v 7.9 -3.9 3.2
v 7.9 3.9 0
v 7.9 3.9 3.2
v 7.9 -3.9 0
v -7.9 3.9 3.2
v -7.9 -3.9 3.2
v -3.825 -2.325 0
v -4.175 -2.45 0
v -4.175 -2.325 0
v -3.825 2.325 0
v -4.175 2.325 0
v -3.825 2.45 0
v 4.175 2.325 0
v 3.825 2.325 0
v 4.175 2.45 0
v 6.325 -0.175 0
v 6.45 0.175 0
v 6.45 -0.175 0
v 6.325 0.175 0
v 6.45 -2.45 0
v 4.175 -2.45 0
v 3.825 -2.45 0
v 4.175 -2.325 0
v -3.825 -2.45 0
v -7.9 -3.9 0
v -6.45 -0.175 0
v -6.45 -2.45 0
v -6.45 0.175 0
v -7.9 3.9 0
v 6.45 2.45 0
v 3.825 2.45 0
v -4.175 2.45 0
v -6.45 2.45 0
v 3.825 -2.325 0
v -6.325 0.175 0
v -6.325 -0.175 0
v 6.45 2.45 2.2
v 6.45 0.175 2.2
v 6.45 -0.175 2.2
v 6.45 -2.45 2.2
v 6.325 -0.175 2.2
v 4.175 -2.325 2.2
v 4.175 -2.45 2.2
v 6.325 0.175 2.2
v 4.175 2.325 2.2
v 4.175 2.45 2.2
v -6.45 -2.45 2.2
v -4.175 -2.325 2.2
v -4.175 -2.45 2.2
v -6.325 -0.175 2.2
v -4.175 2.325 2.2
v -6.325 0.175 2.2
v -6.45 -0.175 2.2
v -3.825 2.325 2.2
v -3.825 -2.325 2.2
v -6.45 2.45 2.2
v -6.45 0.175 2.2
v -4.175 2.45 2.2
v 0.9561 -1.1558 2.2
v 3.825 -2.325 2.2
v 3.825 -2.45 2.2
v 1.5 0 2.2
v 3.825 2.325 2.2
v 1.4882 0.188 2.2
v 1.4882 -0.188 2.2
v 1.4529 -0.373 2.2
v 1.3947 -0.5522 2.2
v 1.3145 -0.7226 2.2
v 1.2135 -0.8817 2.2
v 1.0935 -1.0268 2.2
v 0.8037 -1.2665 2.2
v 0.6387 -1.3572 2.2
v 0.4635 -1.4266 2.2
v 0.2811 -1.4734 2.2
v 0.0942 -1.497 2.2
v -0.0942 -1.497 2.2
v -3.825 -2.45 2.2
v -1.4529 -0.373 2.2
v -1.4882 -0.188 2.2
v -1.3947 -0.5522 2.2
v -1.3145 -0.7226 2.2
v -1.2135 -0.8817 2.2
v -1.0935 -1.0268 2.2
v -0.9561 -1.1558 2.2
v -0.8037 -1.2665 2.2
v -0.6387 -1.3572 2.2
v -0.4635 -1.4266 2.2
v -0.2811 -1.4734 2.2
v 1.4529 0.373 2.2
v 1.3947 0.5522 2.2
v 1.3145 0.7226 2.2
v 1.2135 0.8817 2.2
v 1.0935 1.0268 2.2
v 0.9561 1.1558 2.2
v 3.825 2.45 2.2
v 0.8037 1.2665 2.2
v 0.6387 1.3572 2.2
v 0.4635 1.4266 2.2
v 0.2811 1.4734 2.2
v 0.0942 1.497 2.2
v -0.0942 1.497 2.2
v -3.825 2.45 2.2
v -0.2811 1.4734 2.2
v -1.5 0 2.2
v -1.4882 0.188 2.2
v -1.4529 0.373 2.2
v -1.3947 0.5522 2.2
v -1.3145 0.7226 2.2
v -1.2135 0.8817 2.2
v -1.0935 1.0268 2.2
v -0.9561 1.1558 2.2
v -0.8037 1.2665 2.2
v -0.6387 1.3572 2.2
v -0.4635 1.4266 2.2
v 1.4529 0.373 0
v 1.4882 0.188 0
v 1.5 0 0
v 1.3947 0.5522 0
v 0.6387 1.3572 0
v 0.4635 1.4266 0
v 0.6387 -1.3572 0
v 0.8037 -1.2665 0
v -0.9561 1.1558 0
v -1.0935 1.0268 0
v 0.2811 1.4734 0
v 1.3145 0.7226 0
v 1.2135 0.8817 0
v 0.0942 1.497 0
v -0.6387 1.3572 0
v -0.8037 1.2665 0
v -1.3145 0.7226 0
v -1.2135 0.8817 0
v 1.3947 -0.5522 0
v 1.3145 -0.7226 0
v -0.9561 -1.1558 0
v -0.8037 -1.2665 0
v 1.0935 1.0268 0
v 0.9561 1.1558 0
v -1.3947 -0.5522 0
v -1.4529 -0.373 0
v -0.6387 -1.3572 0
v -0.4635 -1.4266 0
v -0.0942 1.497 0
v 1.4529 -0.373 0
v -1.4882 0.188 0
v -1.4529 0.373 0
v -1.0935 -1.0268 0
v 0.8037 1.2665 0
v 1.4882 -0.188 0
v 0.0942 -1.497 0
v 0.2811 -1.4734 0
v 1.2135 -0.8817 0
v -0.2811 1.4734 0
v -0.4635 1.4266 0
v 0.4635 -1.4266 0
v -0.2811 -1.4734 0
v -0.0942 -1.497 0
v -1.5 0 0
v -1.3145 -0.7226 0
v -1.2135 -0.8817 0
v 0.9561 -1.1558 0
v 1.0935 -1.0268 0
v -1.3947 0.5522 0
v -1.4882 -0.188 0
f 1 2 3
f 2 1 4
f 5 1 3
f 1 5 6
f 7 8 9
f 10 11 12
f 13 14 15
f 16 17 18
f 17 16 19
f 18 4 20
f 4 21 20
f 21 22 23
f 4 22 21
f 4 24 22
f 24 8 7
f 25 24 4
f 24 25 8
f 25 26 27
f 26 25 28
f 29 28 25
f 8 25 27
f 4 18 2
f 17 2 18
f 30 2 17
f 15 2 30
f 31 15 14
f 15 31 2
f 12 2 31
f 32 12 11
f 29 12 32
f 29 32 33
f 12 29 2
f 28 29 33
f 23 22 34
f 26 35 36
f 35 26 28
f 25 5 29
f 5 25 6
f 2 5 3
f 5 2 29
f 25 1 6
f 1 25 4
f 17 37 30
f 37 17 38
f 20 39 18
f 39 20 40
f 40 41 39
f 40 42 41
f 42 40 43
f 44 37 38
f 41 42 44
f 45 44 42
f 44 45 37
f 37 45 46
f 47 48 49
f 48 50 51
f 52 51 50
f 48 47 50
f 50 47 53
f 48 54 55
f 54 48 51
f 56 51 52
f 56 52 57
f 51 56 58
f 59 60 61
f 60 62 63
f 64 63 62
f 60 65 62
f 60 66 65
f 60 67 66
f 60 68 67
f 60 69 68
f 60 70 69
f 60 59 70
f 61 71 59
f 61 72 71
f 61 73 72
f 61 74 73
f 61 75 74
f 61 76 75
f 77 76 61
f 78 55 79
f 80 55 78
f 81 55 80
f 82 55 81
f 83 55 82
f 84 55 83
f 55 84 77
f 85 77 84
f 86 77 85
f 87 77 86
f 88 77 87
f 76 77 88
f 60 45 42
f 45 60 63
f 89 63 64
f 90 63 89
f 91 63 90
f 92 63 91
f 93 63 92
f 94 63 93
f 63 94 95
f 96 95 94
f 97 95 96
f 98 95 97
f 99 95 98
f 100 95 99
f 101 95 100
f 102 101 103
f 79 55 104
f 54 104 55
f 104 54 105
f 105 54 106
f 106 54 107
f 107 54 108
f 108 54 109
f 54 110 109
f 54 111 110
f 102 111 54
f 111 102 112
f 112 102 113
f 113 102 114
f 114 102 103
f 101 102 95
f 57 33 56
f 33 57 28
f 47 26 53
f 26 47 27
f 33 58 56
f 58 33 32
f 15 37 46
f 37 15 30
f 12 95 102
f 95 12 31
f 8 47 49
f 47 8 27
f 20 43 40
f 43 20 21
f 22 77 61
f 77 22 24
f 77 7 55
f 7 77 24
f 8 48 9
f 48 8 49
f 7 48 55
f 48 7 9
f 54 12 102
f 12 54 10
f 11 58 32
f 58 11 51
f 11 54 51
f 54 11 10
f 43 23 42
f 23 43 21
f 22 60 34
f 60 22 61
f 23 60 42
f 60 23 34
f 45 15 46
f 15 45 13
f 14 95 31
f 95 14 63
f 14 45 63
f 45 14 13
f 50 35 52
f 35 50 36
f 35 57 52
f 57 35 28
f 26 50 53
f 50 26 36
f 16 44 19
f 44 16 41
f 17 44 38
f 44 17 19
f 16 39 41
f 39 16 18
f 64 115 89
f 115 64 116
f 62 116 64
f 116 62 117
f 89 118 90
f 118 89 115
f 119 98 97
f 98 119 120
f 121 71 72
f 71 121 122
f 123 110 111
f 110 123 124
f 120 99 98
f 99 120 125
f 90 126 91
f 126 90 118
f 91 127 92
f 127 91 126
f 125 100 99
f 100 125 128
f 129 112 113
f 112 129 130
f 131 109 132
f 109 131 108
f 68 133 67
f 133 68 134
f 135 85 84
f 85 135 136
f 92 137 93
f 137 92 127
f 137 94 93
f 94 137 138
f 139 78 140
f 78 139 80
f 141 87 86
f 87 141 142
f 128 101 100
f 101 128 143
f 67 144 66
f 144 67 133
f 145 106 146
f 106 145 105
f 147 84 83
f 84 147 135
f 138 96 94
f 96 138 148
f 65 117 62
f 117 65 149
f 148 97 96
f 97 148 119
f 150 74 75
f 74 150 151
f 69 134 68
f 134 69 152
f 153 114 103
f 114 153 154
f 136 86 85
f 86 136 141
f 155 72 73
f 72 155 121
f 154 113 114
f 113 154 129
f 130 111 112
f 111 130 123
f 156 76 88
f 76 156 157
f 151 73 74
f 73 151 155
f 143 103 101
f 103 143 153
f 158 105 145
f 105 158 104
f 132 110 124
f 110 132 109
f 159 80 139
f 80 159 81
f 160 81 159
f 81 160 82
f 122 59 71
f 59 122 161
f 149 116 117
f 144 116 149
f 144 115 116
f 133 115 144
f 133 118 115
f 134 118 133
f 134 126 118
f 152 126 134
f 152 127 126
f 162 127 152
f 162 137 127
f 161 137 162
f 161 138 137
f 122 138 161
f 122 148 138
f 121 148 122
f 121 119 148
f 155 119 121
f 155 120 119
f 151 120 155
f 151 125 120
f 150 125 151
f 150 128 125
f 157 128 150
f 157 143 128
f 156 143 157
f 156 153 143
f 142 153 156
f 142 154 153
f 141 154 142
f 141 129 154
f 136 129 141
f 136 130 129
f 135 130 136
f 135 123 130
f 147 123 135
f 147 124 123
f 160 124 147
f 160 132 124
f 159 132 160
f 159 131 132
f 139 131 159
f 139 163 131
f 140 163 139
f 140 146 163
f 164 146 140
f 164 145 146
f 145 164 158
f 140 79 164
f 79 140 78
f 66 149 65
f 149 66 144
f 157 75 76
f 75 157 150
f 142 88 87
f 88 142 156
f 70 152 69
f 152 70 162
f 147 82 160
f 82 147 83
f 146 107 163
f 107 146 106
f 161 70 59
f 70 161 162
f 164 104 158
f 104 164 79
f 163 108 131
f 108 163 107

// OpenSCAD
// file: globals.scad
// brick dependent parameters
brick_height = 9.6; // Height of the non-stud portion of a regular brick.
stud_spacing=8; // Distance between centers of studs.
stud_diameter=4.85; // Diameters of studs.
wall_play=0.1; // Amount of space removed from the outer edge of bricks so that they will fit next to each other.
roof_thickness=1;
wall_thickness=1.45;

post_wall_thickness = 0.85;
pin_diameter=3 ;
post_diameter=6.5;

hollow_stud_inner_diameter = 3.1;
stud_height = 1.8;

axle_spline_width = 2.0;
axle_diameter = 5 * 1;

$fn=50;

// printing depoendent parameters
STUD_SCALE_UP = 1.03;
STUD_SCALE_SIDE = 1.0;
STUD_SCALE_DOWN = 1.0;
SPLINE_SCALE_DOWN = 0.5;
SPLINE_SCALE_UP = 1.0;
SPLINE_SCALE_SIDE = 0.5;

module uncenter(width, length, height) {
    translate([((8 * length) / 2), ((8 * width) / 2), height ? ((8 * height) / 2) : 0]) children();
}

module center(width, length, height) {
    translate([-((8 * length) / 2), -((8 * width) / 2), height ? -((8 * height) / 2) : 0]) children();
}

module place(x, y, z=0) {
    translate([8 * y, 8 * x, z * 9.6]) children();
}
// main file
include <globals.scad>

module block(
    width=1,
    length=2,
    height=1,
    type="brick",
    shape="cube",
    brand="lego",
    stud_type="solid",
    horizontal_holes=false,
    vertical_axle_holes=false,
    reinforcement=false,
    wing_type="full",
    wing_end_width=2,
    wing_base_length=2,
    stud_notches=false,
    slope_stud_rows=1,
    slope_end_height=0,
    curve_stud_rows=1,
    curve_type="concave",
    curve_end_height=0,
    roadway_width=0,
    roadway_length=0,
    roadway_x=0,
    roadway_y=0,
    stud_rescale=STUD_SCALE_UP,
    spline_rescale=SPLINE_SCALE_DOWN,
    dual_sided=false,
    dual_bottom=false,
    force_orientation=false
    ) {
    post_wall_thickness = (brand == "lego" ? 0.85 : 1);
    wall_thickness=(brand == "lego" ? 1.45 : 1.5);
    stud_diameter=(brand == "lego" ? 4.85 : 9.35);
    hollow_stud_inner_diameter = (brand == "lego" ? 3.1 : 6.7);
    stud_height=(brand == "lego" ? 1.8 : 4.4);
    stud_spacing=(brand == "lego" ? 8 : 8 * 2);
    block_height=(brand == "lego" ? (type == "baseplate" ? 1.3 : 9.6) : 9.6 * 2);
    pin_diameter=(brand == "lego" ? 3 : 3 * 2);
    post_diameter=(brand == "lego" ? 6.5 : 13.2);
    cylinder_precision=(brand == "lego" ? 0.1 : 0.05);
    reinforcing_width = (brand == "lego" ? 0.7 : 1);

    spline_length = (brand == "lego" ? 0.25 : 1.7) * spline_rescale;
    spline_thickness = (brand == "lego" ? 0.7 : 1.3) * spline_rescale;

    horizontal_hole_diameter = (brand == "lego" ? 4.8 : 4.8 * 2);
    horizontal_hole_z_offset = (brand == "lego" ? 5.8 : 5.8 * 2);
    horizontal_hole_bevel_diameter = (brand == "lego" ? 6.2 : 6.2 * 2);
    horizontal_hole_bevel_depth = (brand == "lego" ? 0.9 : 0.9 * 1.5 / 1.2 );

    roof_thickness = (type == "baseplate" || dual_sided ? block_height * height : 1 * 1);

    // Brand-independent measurements.
    axle_spline_width = 2.0;
    axle_diameter = 5 * 1;
    wall_play = 0.1 * 1;
    horizontal_hole_wall_thickness = 1 * 1;

    // Ensure that width is always less than or equal to length.
    real_width = (type == "wing" || force_orientation) ? width : min(width, length);
    real_length = (type == "wing" || force_orientation) ? length : max(width, length);
    real_height = max((type == "baseplate" ? 1 : 1/3), height);

    // Ensure that the wing end width is even if the width is even, odd if odd, and a reasonable value.
    real_wing_end_width = (wing_type == "full"
        ?
        min(real_width - 2, ((real_width % 2 == 0) ? 
            (max(2, (
                wing_end_width % 2 == 0 ?
                (wing_end_width)
                :
                (wing_end_width-1)
            )))
            :
            (max(1, (
                wing_end_width % 2 == 0 ?
                (wing_end_width-1)
                :
                (wing_end_width)
            )))
        ))
        :
        (min(real_width-1, max(1, wing_end_width))) // Half-wing
    );

    // Ensure that the base length is a reasonable value.
    real_wing_base_length = min(real_length-1, max(1, wing_base_length)) + 1; // +1 because the angle starts before the last stud.
        
    // Validate all the rest of the arguments.
    real_slope_end_height = max(0, min(real_height - 1/3, slope_end_height));
    real_slope_stud_rows = min(real_length - 1, slope_stud_rows);
    real_curve_stud_rows = max(0, curve_stud_rows);
    real_curve_type = (curve_type == "convex" ? "convex" : "concave");
    real_curve_end_height = max(0, min(real_height - 1/3, curve_end_height));
    real_horizontal_holes = horizontal_holes && ((type == "baseplate" && real_height >= 8) || real_height >= 1) && !dual_sided;
    real_vertical_axle_holes = vertical_axle_holes && real_width > 1;
    real_reinforcement = reinforcement && type != "baseplate" && type != "tile" && !dual_sided;

    real_roadway_width = max(0, min(roadway_width, real_width));
    real_roadway_length = max(0, min(roadway_length, real_length));
    real_roadway_x = max(0, min(real_length - real_roadway_length, roadway_x));
    real_roadway_y = max(0, min(real_width - real_roadway_width, roadway_y));

    real_stud_notches = stud_notches && !dual_sided;
    real_dual_sided = dual_sided && type != "curve" && type != "slope" && type != "tile";
    real_dual_bottom = dual_bottom && !real_dual_sided && type != "curve" && type != "slope";

    total_studs_width = (stud_diameter * stud_rescale * real_width) + ((real_width - 1) * (stud_spacing - (stud_diameter * stud_rescale)));
    total_studs_length = (stud_diameter * stud_rescale * real_length) + ((real_length - 1) * (stud_spacing - (stud_diameter * stud_rescale)));

    total_posts_width = (post_diameter * (real_width - 1)) + ((real_width - 2) * (stud_spacing - post_diameter));
    total_posts_length = (post_diameter * (real_length - 1)) + ((real_length - 2) * (stud_spacing - post_diameter));

    total_axles_width = (axle_diameter * (real_width - 1)) + ((real_width - 2) * (stud_spacing - axle_diameter));
    total_axles_length = (axle_diameter * (real_length - 1)) + ((real_length - 2) * (stud_spacing - axle_diameter));

    total_pins_width = (pin_diameter * (real_width - 1)) + max(0, ((real_width - 2) * (stud_spacing - pin_diameter)));
    total_pins_length = (pin_diameter * (real_length - 1)) + max(0, ((real_length - 2) * (stud_spacing - pin_diameter)));

    overall_length = (real_length * stud_spacing) - (2 * wall_play);
    overall_width = (real_width * stud_spacing) - (2 * wall_play);

    wing_slope = (wing_type == "full" ?
        ((real_width - (real_wing_end_width + 1)) / 2) / (real_length - (real_wing_base_length - 1))
        :
        (real_width - (real_wing_end_width)) / (real_length - (real_wing_base_length - 1))
    );

   translate([-overall_length/2, -overall_width/2, 0]) // Comment to position at 0,0,0 instead of centered on X and Y.
        union() {
            difference() {
                union() {
                    /**
                     * Include any union()s that should come before the final difference()s.
                     */
                    
                    // The mass of the block.
                    if (shape == "cube"){
                        difference() {
                            cube([overall_length, overall_width, real_height * block_height]);
                            translate([wall_thickness,wall_thickness,-roof_thickness]) cube([overall_length-wall_thickness*2,overall_width-wall_thickness*2,block_height*real_height]);
                        }
                    }
                    else if (shape == "cylinder" && width == length) {
                        translate([overall_length/2, overall_width/2, 0])
                        difference() {
                            cylinder(d=overall_length, h=real_height * block_height);
                            cylinder(d=overall_length-wall_thickness*2, h=block_height*real_height-roof_thickness);
                        }
                    }

                    // The studs on top of the block (if it's not a tile).
                    if ( type != "tile" && !real_dual_bottom ) {
                        translate([stud_diameter * stud_rescale / 2, stud_diameter * stud_rescale / 2, 0]) 
                        translate([(overall_length - total_studs_length)/2, (overall_width - total_studs_width)/2, 0]) {
                            for (ycount=[0:real_width-1]) {
                                for (xcount=[0:real_length-1]) {
                                    if (!skip_this_stud(xcount, ycount)) {
                                        translate([xcount*stud_spacing,ycount*stud_spacing,block_height*real_height]) stud();
                                    }
                                }
                            }
                       }
                    }

                    // Interior splines to catch the studs.
                    translate([stud_spacing / 2 - wall_play - (spline_thickness/2), 0, 0]) for (xcount = [0:real_length-1]) {
                        translate([0,wall_thickness,0]) translate([xcount * stud_spacing, 0, 0]) cube([spline_thickness, spline_length, real_height * block_height]);
                        translate([xcount * stud_spacing, overall_width - wall_thickness -  spline_length, 0]) cube([spline_thickness, spline_length, real_height * block_height]);
                    }

                    translate([0, stud_spacing / 2 - wall_play - (spline_thickness/2), 0]) for (ycount = [0:real_width-1]) {
                        translate([wall_thickness,0,0]) translate([0, ycount * stud_spacing, 0]) cube([spline_length, spline_thickness, real_height * block_height]);
                        translate([overall_length - wall_thickness -  spline_length, ycount * stud_spacing, 0]) cube([spline_length, spline_thickness, real_height * block_height]);
                    }

                    if (type != "baseplate" && real_width > 1 && real_length > 1 && !real_dual_sided && roof_thickness < block_height * height) {
                        // Reinforcements and posts
                        translate([post_diameter / 2, post_diameter / 2, 0]) {
                            translate([(overall_length - total_posts_length)/2, (overall_width - total_posts_width)/2, 0]) {
                                union() {
                                    // Posts
                                    if(type != "tile" || real_reinforcement){
                                        for (ycount=[1:real_width-1]) {
                                            for (xcount=[1:real_length-1]) {
                                                translate([(xcount-1)*stud_spacing,(ycount-1)*stud_spacing,0]) post(real_vertical_axle_holes && !skip_this_vertical_axle_hole(xcount, ycount));
                                            }
                                        }
                                    }

                                    // Reinforcements
                                    if (real_reinforcement) {
                                        difference() {
                                            for (ycount=[1:real_width-1]) {
                                                for (xcount=[1:real_length-1]) {
                                                    translate([(xcount-1)*stud_spacing,(ycount-1)*stud_spacing,0]) reinforcement();
                                                }
                                            }

                                            for (ycount=[1:real_width-1]) {
                                                for (xcount=[1:real_length-1]) {
                                                    translate([(xcount-1)*stud_spacing,(ycount-1)*stud_spacing,-0.5]) cylinder(r=post_diameter/2-0.1, h=real_height*block_height+0.5, $fs=cylinder_precision);
                                                }
                                            }
                                        }
                                    }
                                }
                            }
                        }
                    }

                    if (type != "baseplate" && (real_width == 1 || real_length == 1) && real_width != real_length && !real_dual_sided && roof_thickness < block_height * height) {
                        // Pins
                        if(!real_reinforcement){
                            if (real_width == 1) {
                                translate([(pin_diameter/2) + (overall_length - total_pins_length) / 2, overall_width/2, 0]) {
                                    for (xcount=[1:real_length-1]) {
                                        translate([(xcount-1)*stud_spacing,0,0]) cylinder(r=pin_diameter/2,h=block_height*real_height,$fs=cylinder_precision);
                                    }
                                }
                            }
                            else {
                                translate([overall_length/2, (pin_diameter/2) + (overall_width - total_pins_width) / 2, 0]) {
                                    for (ycount=[1:real_width-1]) {
                                        translate([0,(ycount-1)*stud_spacing,0]) cylinder(r=pin_diameter/2,h=block_height*real_height,$fs=cylinder_precision);
                                    }
                                }
                            }
                        }
                    }

                    if (real_horizontal_holes) {
                        // The holes for the horizontal axles.
                        // 1-length bricks have the hole underneath the stud.
                        // >1-length bricks have the holes between the studs.
                        for (height_index = [0 : height - 1]) {
                            translate([horizontal_holes_x_offset(), overall_width, height_index * block_height]) 
                            translate([(overall_length - total_studs_length)/2, 0, 0]) {
                            for (axle_hole_index=[horizontal_hole_start_index() : horizontal_hole_end_index()]) {
                                if (!skip_this_horizontal_hole(axle_hole_index, height_index)) {
                                        translate([axle_hole_index*stud_spacing,0,horizontal_hole_z_offset]) rotate([90, 0, 0])  cylinder(r=horizontal_hole_diameter/2 + horizontal_hole_wall_thickness, h=overall_width,$fs=cylinder_precision);
                                    }
                                }
                            }
                        }
                    }
                }

                
                /**
                 * Include any differences from the basic brick here.
                 */
                
                if (real_vertical_axle_holes) {
                    if (real_width > 1 && real_length > 1) {
                        translate([axle_diameter / 2, axle_diameter / 2, 0]) {
                            translate([(overall_length - total_axles_length)/2, (overall_width - total_axles_width)/2, 0]) {
                                for (ycount = [ 1 : real_width - 1 ]) {
                                    for (xcount = [ 1 : real_length - 1]) {
                                        if (!skip_this_vertical_axle_hole(xcount, ycount)) {
                                            translate([(xcount-1)*stud_spacing,(ycount-1)*stud_spacing,-block_height/2]) axle();
                                        }
                                    }
                                }
                            }
                        }
                    }
                }

                if (type == "wing") {
                    if (wing_type == "full" || wing_type == "right")  {
                        translate([0, 0, -0.5]) linear_extrude(block_height * real_height + stud_height + 1) polygon(points=[
                            [stud_spacing * (real_wing_base_length-1), -0.01],
                            [overall_length + 0.01, -0.01],
                            [overall_length + 0.01, (wing_type == "full" ?
                                (overall_width / 2 - (real_wing_end_width * stud_spacing / 2))
                                :
                                (overall_width - (real_wing_end_width * stud_spacing))
                            )]
                        ]
                        );
                    }
                    if (wing_type == "full" || wing_type == "left")  {
                        translate([0, 0, -0.5]) linear_extrude(block_height * real_height + stud_height + 1) polygon(points=[
                            [stud_spacing * (real_wing_base_length-1), overall_width + 0.01],
                            [overall_length + 0.01, overall_width + 0.01],
                            [overall_length + 0.01, (wing_type == "full" ? overall_width / 2 : 0) + (real_wing_end_width * stud_spacing / (wing_type == "full" ? 2 : 1))]
                        ]
                        );


                    }
                }
                else if (type == "slope") {
                    translate([0, overall_width+0.5, 0]) rotate([90, 0, 0]) linear_extrude(overall_width+1) polygon(points=[
                        [-0.1, (block_height * real_slope_end_height) + stud_height],
                        [min(overall_length, overall_length - (stud_spacing * real_slope_stud_rows) + (wall_play/2)), real_height * block_height - roof_thickness],
                        [min(overall_length, overall_length - (stud_spacing * real_slope_stud_rows) + (wall_play/2)), real_height * block_height + stud_height + 1],
                        [-0.1, real_height * block_height + stud_height + 1]
                    ]);
                }
                else if (type == "invslope") {
                    translate([0, overall_width+0.5, 0]) rotate([90, 0, 0]) linear_extrude(overall_width+1) polygon(points=[
                        [-0.1, 0],
                        [min(overall_length, overall_length - (stud_spacing * real_slope_stud_rows) + (wall_play/2)), 0],
                        // [min(overall_length, overall_length - (stud_spacing * real_slope_stud_rows) + (wall_play/2)), real_height * block_height + stud_height + 1],
                        [-0.1, real_height * block_height-1]
                    ]);
                }
                else if (type == "curve") {
                    if (real_curve_type == "concave") {
                                            echo(curve_circle_height());
                        difference() {
                            translate([
                                    -curve_circle_length() / 2, // Align the center of the cube with the end of the block.
                                    -0.5, // Center the extra width on the block.
                                    (real_height * block_height) - (curve_circle_height() / 2)  // Align the bottom of the cube with the center of the curve circle.
                                ])
                                cube([curve_circle_length(), overall_width + 1, curve_circle_height()]);

                            translate([
                                    curve_circle_length() / 2,  // Align the end of the curve with the end of the block.
                                    overall_width / 2, // Center it on the block.
                                    (real_height * block_height) - (curve_circle_height() / 2)  // Align the top of the curve with the top of the block.
                                ])
                                rotate([90, 0, 0]) // Rotate sideways
                                translate([0, 0, -overall_width/2]) // Move so the cylinder is z-centered.
                                resize([curve_circle_length(), curve_circle_height(), 0]) // Resize to the approprate scale.
                                cylinder(r=real_height * block_height, h=overall_width, $fs=cylinder_precision);
                        }
                    }
                    else if (real_curve_type == "convex") {
                        union() {
                            translate([0, 0, real_height * block_height]) cube([overall_length - (real_curve_stud_rows * stud_spacing), overall_width, stud_height + .1]);
                            translate([0, 0, block_height * real_height])
                                translate([0, (overall_width+1)/2-.5, 0]) // Center across the end of the block.
                                rotate([90, 0, 0])
                                translate([0, 0, -((overall_width+1)/2)]) // z-center
                                resize([curve_circle_length(), curve_circle_height(), 0]) // Resize to the final dimensions.
                                cylinder(r=block_height * real_height, h=overall_width+1, $fs=cylinder_precision);
                        }
                    }
                }
                else if (type == "baseplate") {
                    // Rounded corners.
                    union() {
                        translate([overall_length, overall_width, 0]) translate([-((stud_spacing / 2) - wall_play), -((stud_spacing / 2) - wall_play), 0]) negative_rounded_corner(r=((stud_spacing / 2) - wall_play), h=real_height * block_height);
                        
                        translate([0, overall_width, 0]) translate([((stud_spacing / 2) - wall_play), -((stud_spacing / 2) - wall_play), 0]) rotate([0, 0, 90]) negative_rounded_corner(r=((stud_spacing / 2) - wall_play), h=real_height * block_height);
                        translate([((stud_spacing / 2) - wall_play), ((stud_spacing / 2) - wall_play), 0]) rotate([0, 0, 180]) negative_rounded_corner(r=((stud_spacing / 2) - wall_play), h=real_height * block_height);
                        translate([overall_length, 0, 0]) translate([-((stud_spacing / 2) - wall_play), ((stud_spacing / 2) - wall_play), 0]) rotate([0, 0, 270]) negative_rounded_corner(r=((stud_spacing / 2) - wall_play), h=real_height * block_height);
                    }
                }

                if (real_horizontal_holes) {
                    // The holes for the horizontal axles.
                    // 1-length bricks have the hole underneath the stud.
                    // >1-length bricks have the holes between the studs.
                    for (height_index = [0 : height - 1]) {
                        translate([horizontal_holes_x_offset(), 0, height_index * block_height]) 
                        translate([(overall_length - total_studs_length)/2, 0, 0]) {
                            for (axle_hole_index=[horizontal_hole_start_index() : horizontal_hole_end_index()]) {
                                if (!skip_this_horizontal_hole(axle_hole_index, height_index)) {
                                    union() {
                                        translate([axle_hole_index*stud_spacing,overall_width,horizontal_hole_z_offset]) rotate([90, 0, 0])  cylinder(r=horizontal_hole_diameter/2, h=overall_width,$fs=cylinder_precision);
    
                                        // Bevels. The +/- 0.1 measurements are here just for nicer previews in OpenSCAD, and could be removed.
                                        translate([axle_hole_index*stud_spacing,horizontal_hole_bevel_depth-0.1,horizontal_hole_z_offset]) rotate([90, 0, 0]) cylinder(r=horizontal_hole_bevel_diameter/2, h=horizontal_hole_bevel_depth+0.1,$fs=cylinder_precision);
                                        translate([axle_hole_index*stud_spacing,overall_width+0.1,horizontal_hole_z_offset]) rotate([90, 0, 0]) cylinder(r=horizontal_hole_bevel_diameter/2, h=horizontal_hole_bevel_depth+0.1,$fs=cylinder_precision);
                                    }
                                }
                            }
                        }
                    }
                }
            }

            
            /**
             * Any final union()s for the brick.
             */
            
            if (type == "wing") {
                difference() {
                    union() {
                        if ( wing_type == "full" || wing_type == "right" ){
                            linear_extrude(block_height * real_height) polygon(points=[
                                [stud_spacing * (real_wing_base_length-1), 0],
                                [overall_length, (wing_type == "full" ? 
                                    ((overall_width / 2) - (real_wing_end_width * stud_spacing / 2))
                                    :
                                    (overall_width - (real_wing_end_width * stud_spacing))
                                )],
                                [overall_length, (wing_type == "full" ? 
                                    ((overall_width / 2) - (real_wing_end_width * stud_spacing / 2))
                                    :
                                    (overall_width - (real_wing_end_width * stud_spacing))
                                ) + wall_thickness],
                                [stud_spacing * (real_wing_base_length-1), wall_thickness]
                            ]);
                        }

                        if (wing_type == "full" || wing_type == "left") {
                            linear_extrude(block_height * real_height) polygon(points=[
                                [stud_spacing * (real_wing_base_length-1), overall_width],
                                [overall_length, (wing_type == "full" ? overall_width / 2 : 0) + (real_wing_end_width * stud_spacing / (wing_type == "full" ? 2 : 1))],
                                [overall_length, (wing_type == "full" ? overall_width / 2 : 0) + (real_wing_end_width * stud_spacing / (wing_type == "full" ? 2 : 1)) - wall_thickness],
                                [stud_spacing * (real_wing_base_length-1), overall_width - wall_thickness]
                            ]);
                        }
                    }

                    if (real_stud_notches) {
                        translate([overall_length/2, overall_width/2, 0])
                            translate([0, 0, -(1/3 * block_height)]) block(
                                width=real_width,
                                length=real_length,
                                height=1/3,
                                brand=brand,
                                stud_type="solid",
                                type="brick",
                                stud_rescale=1.5
                            );
                    }
                }
            }
            else if (type == "slope") {
                translate([0, overall_width, 0]) rotate([90, 0, 0]) linear_extrude(overall_width) polygon(points=[
                    [0, (block_height * real_slope_end_height) + stud_height],
                    [0, (block_height * real_slope_end_height) + stud_height + roof_thickness],
                    [min(overall_length, overall_length - (stud_spacing * real_slope_stud_rows) + (wall_play/2)), real_height * block_height],
                    [min(overall_length, overall_length - (stud_spacing * real_slope_stud_rows) + (wall_play/2)), (real_height * block_height) - roof_thickness]
                ]);
            }
            else if (type == "invslope") {
                translate([0, overall_width, 0]) rotate([90, 0, 0]) linear_extrude(overall_width) polygon(points=[
                    [0, real_height * block_height],
                    [0, (real_height * block_height) - roof_thickness],
                    [min(overall_length, overall_length - (stud_spacing * real_slope_stud_rows) + (wall_play/2)), 0],
                    [min(overall_length, overall_length - (stud_spacing * real_slope_stud_rows) + (wall_play/2)), roof_thickness]
                ]);
            }
            else if (type == "curve") {
                if (real_curve_type == "concave") {
                    intersection() {
                        translate([
                                -curve_circle_length() / 2, // Align the center of the cube with the end of the block.
                                -0.5, // Center the extra width on the block.
                                (real_height * block_height) - (curve_circle_height() / 2)  // Align the bottom of the cube with the center of the curve circle.
                            ])
                            cube([curve_circle_length(), overall_width + 1, curve_circle_height()]);

                        difference() {   
                            translate([
                                    curve_circle_length() / 2,  // Align the end of the curve with the end of the block.
                                    overall_width / 2, // Center it on the block.
                                    (real_height * block_height) - (curve_circle_height() / 2)  // Align the top of the curve with the top of the block.
                                ])
                                rotate([90, 0, 0]) // Rotate sideways
                                translate([0, 0, -overall_width/2]) // Move so the cylinder is z-centered.
                                resize([curve_circle_length(), curve_circle_height(), 0]) // Resize to the approprate scale.
                                cylinder(r=real_height * block_height, h=overall_width, $fs=cylinder_precision);

                            translate([
                                    curve_circle_length() / 2,  // Align the end of the curve with the end of the block.
                                    overall_width / 2, // Center it on the block.
                                    (real_height * block_height) - (curve_circle_height() / 2) // Align the top of the curve with the top of the block.
                                ])
                                rotate([90, 0, 0]) // Rotate sideways
                                translate([0, 0, -overall_width/2]) // Move so the cylinder is z-centered.
                                resize([curve_circle_length() - (wall_thickness * 2), curve_circle_height() - (wall_thickness * 2), 0]) // Resize to the approprate scale.
                                cylinder(r=real_height * block_height, h=overall_width, $fs=cylinder_precision);
                        }
                    }
                }
                else if (real_curve_type == "convex") {
                    intersection() {
                        translate([
                            0,
                            0,
                            (real_height * block_height) - (curve_circle_height() / 2) - wall_thickness // Align the top of the cube with the top of the block.
                        ])
                            cube([curve_circle_length() / 2, overall_width, curve_circle_height() / 2 + wall_thickness]);

                       translate([0, 0, block_height * real_height])
                            translate([0, overall_width/2, 0]) // Center across the end of the block.
                            rotate([90, 0, 0])
                            translate([0, 0, -overall_width/2]) // z-center
                            difference() {
                                resize([curve_circle_length() + (wall_thickness * 2), curve_circle_height() + (wall_thickness * 2), 0]) // Resize to the final dimensions.
                                cylinder(r=block_height * real_height, h=overall_width, $fs=cylinder_precision);

                                translate([0, 0, -0.5]) // The inner cylinder is just a little taller, for nicer OpenSCAD previews.
                                    resize([curve_circle_length(), curve_circle_height(), 0]) // Resize to the final dimensions.
                                    cylinder(r=block_height * real_height, h=overall_width+1, $fs=cylinder_precision);
                            }
                    }
                }
            }
            
            if (real_dual_sided) {
                translate([overall_length/2, overall_width/2, block_height * height]) mirror([0,0,1]) block(
                    width=real_width,
                    length=real_length,
                    height=real_height,
                    type=type,
                    brand=brand,
                    stud_type=stud_type,
                    horizontal_holes=real_horizontal_holes,
                    vertical_axle_holes=real_vertical_axle_holes,
                    reinforcement=real_reinforcement,
                    wing_type=wing_type,
                    wing_end_width=real_wing_end_width,
                    wing_base_length=real_wing_base_length-1,
                    stud_notches=real_stud_notches,
                    slope_stud_rows=real_slope_stud_rows,
                    slope_end_height=real_slope_end_height,
                    curve_stud_rows=real_curve_stud_rows,
                    curve_type=real_curve_type,
                    curve_end_height=real_curve_end_height,
                    roadway_width=real_roadway_width,
                    roadway_length=real_roadway_length,
                    roadway_x=real_roadway_x,
                    roadway_y=real_roadway_y,
                    stud_rescale=stud_rescale,
                    spline_rescale=spline_rescale,
                    dual_sided=false
                );
            }

            if (real_dual_bottom) {
                translate([overall_length/2, overall_width/2, block_height * height * 2]) mirror([0,0,1]) block(
                    width=real_width,
                    length=real_length,
                    height=real_height,
                    type="tile",
                    brand=brand,
                    stud_type=stud_type,
                    horizontal_holes=real_horizontal_holes,
                    vertical_axle_holes=real_vertical_axle_holes,
                    reinforcement=real_reinforcement,
                    wing_type=wing_type,
                    wing_end_width=real_wing_end_width,
                    wing_base_length=real_wing_base_length-1,
                    stud_notches=real_stud_notches,
                    slope_stud_rows=real_slope_stud_rows,
                    slope_end_height=real_slope_end_height,
                    curve_stud_rows=real_curve_stud_rows,
                    curve_type=real_curve_type,
                    curve_end_height=real_curve_end_height,
                    roadway_width=real_roadway_width,
                    roadway_length=real_roadway_length,
                    roadway_x=real_roadway_x,
                    roadway_y=real_roadway_y,
                    stud_rescale=stud_rescale,
                    spline_rescale=spline_rescale,
                    dual_sided=false,
                    dual_bottom=false
                );
            }
    }

    module post(vertical_axle_hole) {
        difference() {
            cylinder(r=post_diameter/2, h=real_height*block_height,$fs=cylinder_precision);
            if (vertical_axle_hole==true) {
                translate([0,0,-block_height/2])
                    axle();
            } else {
                translate([0,0,-0.5]) cylinder(r=(post_diameter/2)-post_wall_thickness, h=real_height*block_height+1,$fs=cylinder_precision);
            }
        }
    }

    module reinforcement() {
        union() {
            translate([0,0,real_height*block_height/2]) union() {
                cube([reinforcing_width, 2 * (stud_spacing - (2 * wall_play)), real_height * block_height],center=true);
                rotate(v=[0,0,1],a=90) cube([reinforcing_width, 2 * (stud_spacing - (2 * wall_play)), real_height * block_height], center=true);
            }
        }
    }

    module axle() {
        translate([0,0,(real_height+1)*block_height/2]) union() {
            cube([axle_diameter,axle_spline_width,(real_height+1)*block_height],center=true);
            cube([axle_spline_width,axle_diameter,(real_height+1)*block_height],center=true);
        }
    }

    module stud() {
        difference() {
            cylinder(r=(stud_diameter*stud_rescale)/2,h=stud_height,$fs=cylinder_precision);

            if (stud_type == "hollow") {
                // 0.5 is for cleaner preview; doesn't affect functionality.
                cylinder(r=(hollow_stud_inner_diameter*stud_rescale)/2,h=stud_height+0.5,$fs=cylinder_precision);
            }
        }
    }

    function curve_circle_length() = (overall_length - (stud_spacing * min(real_length - 1, real_curve_stud_rows)) + (wall_play/2)) * 2;
    function curve_circle_height() = (
            (
                (block_height * real_height) - (real_curve_end_height * block_height)) * 2) - (real_curve_type == "convex" ? (stud_height * 2) + (wall_thickness * 2) : 0);

    function wing_width(x_pos) = (real_width - width_loss(x_pos));

    function width_loss(x_pos) = (type != "wing" ? 0 :
        round((wing_type == "full" ?
            max(0, (2 * wing_slope * (x_pos - (real_wing_base_length - 1)))) + 0.3 // Full wing
            :
            max(0, (wing_slope * (x_pos - (real_wing_base_length - 1)))) + 0.2 // Half wing
        )) // +extra is because full studs can still fit on partially missing bases, but not by much
    );

    function horizontal_hole_start_index() = (
        (
            (type == "slope" && real_slope_stud_rows == 1)
            || (type == "curve" && real_curve_stud_rows == 1)
        )
        ?
        real_length - 1
        :
        0
    );
    function horizontal_hole_end_index() = (
        (
            real_length == 1
            || (type == "slope" && real_slope_stud_rows == 1)
            || (type == "curve" && real_curve_stud_rows == 1)
        )
        ?
        real_length - 1
        :
        real_length - 2
    );
    function skip_this_horizontal_hole(xcount, zcount) = (
        (type == "slope" && ((zcount >= slope_end_height) && (xcount <= real_length - real_slope_stud_rows - 1)))
        ||
        (type == "curve" && ((zcount >= curve_end_height) && (xcount <= real_length - real_curve_stud_rows - 1)))
    );

    function horizontal_holes_x_offset() = (
        (horizontal_hole_diameter / 2)
        + (
            (
                real_length == 1
                || (type == "slope" && real_slope_stud_rows == 1)
                || (type == "curve" && real_curve_stud_rows == 1)
            )
            ?
            0
            :
            (stud_spacing / 2)
        )
    );
    
    function put_stud_here(xcount, ycount) = (
        (type != "wing" && real_roadway_width > 0 && real_roadway_length > 0)
        ||
        (type == "wing" && (
            (wing_type == "full" && (ycount+1 > ceil(width_loss(xcount+1)/2)) && (ycount+1 <= floor(real_width - (width_loss(xcount+1)/2))))
            || (wing_type == "left" && ycount+1 <= wing_width(xcount+1))
            || (wing_type == "right" && ycount >= width_loss(xcount+1))
            )
        )
        ||
        (real_roadway_width == 0 && real_roadway_length == 0)
        ||
        (!pos_in_roadway(xcount, ycount))
    );
    
    function put_vertical_axle_hole_here(xcount, ycount) = (
        !skip_this_axle_hole(xcount, ycount)
    );
    
    function skip_this_vertical_axle_hole(xcount, ycount) = (
        (type == "slope" && xcount < (real_length - real_slope_stud_rows + 1))
        ||
        (type == "curve" && xcount < (real_length - real_curve_stud_rows + 1))
        
    );
    
    function skip_this_stud(xcount, ycount) = (
        (type == "wing" && (
            (wing_type == "full" && ((ycount+1 <= ceil(width_loss(xcount+1)/2)) || (ycount+1 > floor(real_width - (width_loss(xcount+1)/2)))))
            || (wing_type == "left" && ycount+1 > wing_width(xcount+1))
            || (wing_type == "right" && ycount < width_loss(xcount+1))
            )
        )
        ||
        (real_roadway_width > 0 && real_roadway_length > 0 && pos_in_roadway(xcount, ycount))
    );

    function pos_in_roadway(x, y) = (
        x >= real_roadway_x
        && y >= real_roadway_y
        && y < real_roadway_y + real_roadway_width
        && x < real_roadway_x + real_roadway_length
    );
        
    
    module negative_rounded_corner(r,h) {
        difference() {
            translate([0, 0, -.5]) cube([r+1, r+1, h+1]);
            translate([0, 0, -1]) cylinder(r=r, h=h + 2, $fs=cylinder_precision);
        }
    }
}

// module uncenter(width, length, height) {
//     translate([((8 * length) / 2) - 0.1, ((8 * width) / 2) - 0.1, height ? ((8 * height) / 2) - 0.1 : 0]) children();
// }

// module place(x, y, z=0) {
//     translate([8 * y, 8 * x, z * 9.6]) children();
// }

// block(2, 2, 1, shape="cylinder");
block(2, 1, 1/3, type="tile");
